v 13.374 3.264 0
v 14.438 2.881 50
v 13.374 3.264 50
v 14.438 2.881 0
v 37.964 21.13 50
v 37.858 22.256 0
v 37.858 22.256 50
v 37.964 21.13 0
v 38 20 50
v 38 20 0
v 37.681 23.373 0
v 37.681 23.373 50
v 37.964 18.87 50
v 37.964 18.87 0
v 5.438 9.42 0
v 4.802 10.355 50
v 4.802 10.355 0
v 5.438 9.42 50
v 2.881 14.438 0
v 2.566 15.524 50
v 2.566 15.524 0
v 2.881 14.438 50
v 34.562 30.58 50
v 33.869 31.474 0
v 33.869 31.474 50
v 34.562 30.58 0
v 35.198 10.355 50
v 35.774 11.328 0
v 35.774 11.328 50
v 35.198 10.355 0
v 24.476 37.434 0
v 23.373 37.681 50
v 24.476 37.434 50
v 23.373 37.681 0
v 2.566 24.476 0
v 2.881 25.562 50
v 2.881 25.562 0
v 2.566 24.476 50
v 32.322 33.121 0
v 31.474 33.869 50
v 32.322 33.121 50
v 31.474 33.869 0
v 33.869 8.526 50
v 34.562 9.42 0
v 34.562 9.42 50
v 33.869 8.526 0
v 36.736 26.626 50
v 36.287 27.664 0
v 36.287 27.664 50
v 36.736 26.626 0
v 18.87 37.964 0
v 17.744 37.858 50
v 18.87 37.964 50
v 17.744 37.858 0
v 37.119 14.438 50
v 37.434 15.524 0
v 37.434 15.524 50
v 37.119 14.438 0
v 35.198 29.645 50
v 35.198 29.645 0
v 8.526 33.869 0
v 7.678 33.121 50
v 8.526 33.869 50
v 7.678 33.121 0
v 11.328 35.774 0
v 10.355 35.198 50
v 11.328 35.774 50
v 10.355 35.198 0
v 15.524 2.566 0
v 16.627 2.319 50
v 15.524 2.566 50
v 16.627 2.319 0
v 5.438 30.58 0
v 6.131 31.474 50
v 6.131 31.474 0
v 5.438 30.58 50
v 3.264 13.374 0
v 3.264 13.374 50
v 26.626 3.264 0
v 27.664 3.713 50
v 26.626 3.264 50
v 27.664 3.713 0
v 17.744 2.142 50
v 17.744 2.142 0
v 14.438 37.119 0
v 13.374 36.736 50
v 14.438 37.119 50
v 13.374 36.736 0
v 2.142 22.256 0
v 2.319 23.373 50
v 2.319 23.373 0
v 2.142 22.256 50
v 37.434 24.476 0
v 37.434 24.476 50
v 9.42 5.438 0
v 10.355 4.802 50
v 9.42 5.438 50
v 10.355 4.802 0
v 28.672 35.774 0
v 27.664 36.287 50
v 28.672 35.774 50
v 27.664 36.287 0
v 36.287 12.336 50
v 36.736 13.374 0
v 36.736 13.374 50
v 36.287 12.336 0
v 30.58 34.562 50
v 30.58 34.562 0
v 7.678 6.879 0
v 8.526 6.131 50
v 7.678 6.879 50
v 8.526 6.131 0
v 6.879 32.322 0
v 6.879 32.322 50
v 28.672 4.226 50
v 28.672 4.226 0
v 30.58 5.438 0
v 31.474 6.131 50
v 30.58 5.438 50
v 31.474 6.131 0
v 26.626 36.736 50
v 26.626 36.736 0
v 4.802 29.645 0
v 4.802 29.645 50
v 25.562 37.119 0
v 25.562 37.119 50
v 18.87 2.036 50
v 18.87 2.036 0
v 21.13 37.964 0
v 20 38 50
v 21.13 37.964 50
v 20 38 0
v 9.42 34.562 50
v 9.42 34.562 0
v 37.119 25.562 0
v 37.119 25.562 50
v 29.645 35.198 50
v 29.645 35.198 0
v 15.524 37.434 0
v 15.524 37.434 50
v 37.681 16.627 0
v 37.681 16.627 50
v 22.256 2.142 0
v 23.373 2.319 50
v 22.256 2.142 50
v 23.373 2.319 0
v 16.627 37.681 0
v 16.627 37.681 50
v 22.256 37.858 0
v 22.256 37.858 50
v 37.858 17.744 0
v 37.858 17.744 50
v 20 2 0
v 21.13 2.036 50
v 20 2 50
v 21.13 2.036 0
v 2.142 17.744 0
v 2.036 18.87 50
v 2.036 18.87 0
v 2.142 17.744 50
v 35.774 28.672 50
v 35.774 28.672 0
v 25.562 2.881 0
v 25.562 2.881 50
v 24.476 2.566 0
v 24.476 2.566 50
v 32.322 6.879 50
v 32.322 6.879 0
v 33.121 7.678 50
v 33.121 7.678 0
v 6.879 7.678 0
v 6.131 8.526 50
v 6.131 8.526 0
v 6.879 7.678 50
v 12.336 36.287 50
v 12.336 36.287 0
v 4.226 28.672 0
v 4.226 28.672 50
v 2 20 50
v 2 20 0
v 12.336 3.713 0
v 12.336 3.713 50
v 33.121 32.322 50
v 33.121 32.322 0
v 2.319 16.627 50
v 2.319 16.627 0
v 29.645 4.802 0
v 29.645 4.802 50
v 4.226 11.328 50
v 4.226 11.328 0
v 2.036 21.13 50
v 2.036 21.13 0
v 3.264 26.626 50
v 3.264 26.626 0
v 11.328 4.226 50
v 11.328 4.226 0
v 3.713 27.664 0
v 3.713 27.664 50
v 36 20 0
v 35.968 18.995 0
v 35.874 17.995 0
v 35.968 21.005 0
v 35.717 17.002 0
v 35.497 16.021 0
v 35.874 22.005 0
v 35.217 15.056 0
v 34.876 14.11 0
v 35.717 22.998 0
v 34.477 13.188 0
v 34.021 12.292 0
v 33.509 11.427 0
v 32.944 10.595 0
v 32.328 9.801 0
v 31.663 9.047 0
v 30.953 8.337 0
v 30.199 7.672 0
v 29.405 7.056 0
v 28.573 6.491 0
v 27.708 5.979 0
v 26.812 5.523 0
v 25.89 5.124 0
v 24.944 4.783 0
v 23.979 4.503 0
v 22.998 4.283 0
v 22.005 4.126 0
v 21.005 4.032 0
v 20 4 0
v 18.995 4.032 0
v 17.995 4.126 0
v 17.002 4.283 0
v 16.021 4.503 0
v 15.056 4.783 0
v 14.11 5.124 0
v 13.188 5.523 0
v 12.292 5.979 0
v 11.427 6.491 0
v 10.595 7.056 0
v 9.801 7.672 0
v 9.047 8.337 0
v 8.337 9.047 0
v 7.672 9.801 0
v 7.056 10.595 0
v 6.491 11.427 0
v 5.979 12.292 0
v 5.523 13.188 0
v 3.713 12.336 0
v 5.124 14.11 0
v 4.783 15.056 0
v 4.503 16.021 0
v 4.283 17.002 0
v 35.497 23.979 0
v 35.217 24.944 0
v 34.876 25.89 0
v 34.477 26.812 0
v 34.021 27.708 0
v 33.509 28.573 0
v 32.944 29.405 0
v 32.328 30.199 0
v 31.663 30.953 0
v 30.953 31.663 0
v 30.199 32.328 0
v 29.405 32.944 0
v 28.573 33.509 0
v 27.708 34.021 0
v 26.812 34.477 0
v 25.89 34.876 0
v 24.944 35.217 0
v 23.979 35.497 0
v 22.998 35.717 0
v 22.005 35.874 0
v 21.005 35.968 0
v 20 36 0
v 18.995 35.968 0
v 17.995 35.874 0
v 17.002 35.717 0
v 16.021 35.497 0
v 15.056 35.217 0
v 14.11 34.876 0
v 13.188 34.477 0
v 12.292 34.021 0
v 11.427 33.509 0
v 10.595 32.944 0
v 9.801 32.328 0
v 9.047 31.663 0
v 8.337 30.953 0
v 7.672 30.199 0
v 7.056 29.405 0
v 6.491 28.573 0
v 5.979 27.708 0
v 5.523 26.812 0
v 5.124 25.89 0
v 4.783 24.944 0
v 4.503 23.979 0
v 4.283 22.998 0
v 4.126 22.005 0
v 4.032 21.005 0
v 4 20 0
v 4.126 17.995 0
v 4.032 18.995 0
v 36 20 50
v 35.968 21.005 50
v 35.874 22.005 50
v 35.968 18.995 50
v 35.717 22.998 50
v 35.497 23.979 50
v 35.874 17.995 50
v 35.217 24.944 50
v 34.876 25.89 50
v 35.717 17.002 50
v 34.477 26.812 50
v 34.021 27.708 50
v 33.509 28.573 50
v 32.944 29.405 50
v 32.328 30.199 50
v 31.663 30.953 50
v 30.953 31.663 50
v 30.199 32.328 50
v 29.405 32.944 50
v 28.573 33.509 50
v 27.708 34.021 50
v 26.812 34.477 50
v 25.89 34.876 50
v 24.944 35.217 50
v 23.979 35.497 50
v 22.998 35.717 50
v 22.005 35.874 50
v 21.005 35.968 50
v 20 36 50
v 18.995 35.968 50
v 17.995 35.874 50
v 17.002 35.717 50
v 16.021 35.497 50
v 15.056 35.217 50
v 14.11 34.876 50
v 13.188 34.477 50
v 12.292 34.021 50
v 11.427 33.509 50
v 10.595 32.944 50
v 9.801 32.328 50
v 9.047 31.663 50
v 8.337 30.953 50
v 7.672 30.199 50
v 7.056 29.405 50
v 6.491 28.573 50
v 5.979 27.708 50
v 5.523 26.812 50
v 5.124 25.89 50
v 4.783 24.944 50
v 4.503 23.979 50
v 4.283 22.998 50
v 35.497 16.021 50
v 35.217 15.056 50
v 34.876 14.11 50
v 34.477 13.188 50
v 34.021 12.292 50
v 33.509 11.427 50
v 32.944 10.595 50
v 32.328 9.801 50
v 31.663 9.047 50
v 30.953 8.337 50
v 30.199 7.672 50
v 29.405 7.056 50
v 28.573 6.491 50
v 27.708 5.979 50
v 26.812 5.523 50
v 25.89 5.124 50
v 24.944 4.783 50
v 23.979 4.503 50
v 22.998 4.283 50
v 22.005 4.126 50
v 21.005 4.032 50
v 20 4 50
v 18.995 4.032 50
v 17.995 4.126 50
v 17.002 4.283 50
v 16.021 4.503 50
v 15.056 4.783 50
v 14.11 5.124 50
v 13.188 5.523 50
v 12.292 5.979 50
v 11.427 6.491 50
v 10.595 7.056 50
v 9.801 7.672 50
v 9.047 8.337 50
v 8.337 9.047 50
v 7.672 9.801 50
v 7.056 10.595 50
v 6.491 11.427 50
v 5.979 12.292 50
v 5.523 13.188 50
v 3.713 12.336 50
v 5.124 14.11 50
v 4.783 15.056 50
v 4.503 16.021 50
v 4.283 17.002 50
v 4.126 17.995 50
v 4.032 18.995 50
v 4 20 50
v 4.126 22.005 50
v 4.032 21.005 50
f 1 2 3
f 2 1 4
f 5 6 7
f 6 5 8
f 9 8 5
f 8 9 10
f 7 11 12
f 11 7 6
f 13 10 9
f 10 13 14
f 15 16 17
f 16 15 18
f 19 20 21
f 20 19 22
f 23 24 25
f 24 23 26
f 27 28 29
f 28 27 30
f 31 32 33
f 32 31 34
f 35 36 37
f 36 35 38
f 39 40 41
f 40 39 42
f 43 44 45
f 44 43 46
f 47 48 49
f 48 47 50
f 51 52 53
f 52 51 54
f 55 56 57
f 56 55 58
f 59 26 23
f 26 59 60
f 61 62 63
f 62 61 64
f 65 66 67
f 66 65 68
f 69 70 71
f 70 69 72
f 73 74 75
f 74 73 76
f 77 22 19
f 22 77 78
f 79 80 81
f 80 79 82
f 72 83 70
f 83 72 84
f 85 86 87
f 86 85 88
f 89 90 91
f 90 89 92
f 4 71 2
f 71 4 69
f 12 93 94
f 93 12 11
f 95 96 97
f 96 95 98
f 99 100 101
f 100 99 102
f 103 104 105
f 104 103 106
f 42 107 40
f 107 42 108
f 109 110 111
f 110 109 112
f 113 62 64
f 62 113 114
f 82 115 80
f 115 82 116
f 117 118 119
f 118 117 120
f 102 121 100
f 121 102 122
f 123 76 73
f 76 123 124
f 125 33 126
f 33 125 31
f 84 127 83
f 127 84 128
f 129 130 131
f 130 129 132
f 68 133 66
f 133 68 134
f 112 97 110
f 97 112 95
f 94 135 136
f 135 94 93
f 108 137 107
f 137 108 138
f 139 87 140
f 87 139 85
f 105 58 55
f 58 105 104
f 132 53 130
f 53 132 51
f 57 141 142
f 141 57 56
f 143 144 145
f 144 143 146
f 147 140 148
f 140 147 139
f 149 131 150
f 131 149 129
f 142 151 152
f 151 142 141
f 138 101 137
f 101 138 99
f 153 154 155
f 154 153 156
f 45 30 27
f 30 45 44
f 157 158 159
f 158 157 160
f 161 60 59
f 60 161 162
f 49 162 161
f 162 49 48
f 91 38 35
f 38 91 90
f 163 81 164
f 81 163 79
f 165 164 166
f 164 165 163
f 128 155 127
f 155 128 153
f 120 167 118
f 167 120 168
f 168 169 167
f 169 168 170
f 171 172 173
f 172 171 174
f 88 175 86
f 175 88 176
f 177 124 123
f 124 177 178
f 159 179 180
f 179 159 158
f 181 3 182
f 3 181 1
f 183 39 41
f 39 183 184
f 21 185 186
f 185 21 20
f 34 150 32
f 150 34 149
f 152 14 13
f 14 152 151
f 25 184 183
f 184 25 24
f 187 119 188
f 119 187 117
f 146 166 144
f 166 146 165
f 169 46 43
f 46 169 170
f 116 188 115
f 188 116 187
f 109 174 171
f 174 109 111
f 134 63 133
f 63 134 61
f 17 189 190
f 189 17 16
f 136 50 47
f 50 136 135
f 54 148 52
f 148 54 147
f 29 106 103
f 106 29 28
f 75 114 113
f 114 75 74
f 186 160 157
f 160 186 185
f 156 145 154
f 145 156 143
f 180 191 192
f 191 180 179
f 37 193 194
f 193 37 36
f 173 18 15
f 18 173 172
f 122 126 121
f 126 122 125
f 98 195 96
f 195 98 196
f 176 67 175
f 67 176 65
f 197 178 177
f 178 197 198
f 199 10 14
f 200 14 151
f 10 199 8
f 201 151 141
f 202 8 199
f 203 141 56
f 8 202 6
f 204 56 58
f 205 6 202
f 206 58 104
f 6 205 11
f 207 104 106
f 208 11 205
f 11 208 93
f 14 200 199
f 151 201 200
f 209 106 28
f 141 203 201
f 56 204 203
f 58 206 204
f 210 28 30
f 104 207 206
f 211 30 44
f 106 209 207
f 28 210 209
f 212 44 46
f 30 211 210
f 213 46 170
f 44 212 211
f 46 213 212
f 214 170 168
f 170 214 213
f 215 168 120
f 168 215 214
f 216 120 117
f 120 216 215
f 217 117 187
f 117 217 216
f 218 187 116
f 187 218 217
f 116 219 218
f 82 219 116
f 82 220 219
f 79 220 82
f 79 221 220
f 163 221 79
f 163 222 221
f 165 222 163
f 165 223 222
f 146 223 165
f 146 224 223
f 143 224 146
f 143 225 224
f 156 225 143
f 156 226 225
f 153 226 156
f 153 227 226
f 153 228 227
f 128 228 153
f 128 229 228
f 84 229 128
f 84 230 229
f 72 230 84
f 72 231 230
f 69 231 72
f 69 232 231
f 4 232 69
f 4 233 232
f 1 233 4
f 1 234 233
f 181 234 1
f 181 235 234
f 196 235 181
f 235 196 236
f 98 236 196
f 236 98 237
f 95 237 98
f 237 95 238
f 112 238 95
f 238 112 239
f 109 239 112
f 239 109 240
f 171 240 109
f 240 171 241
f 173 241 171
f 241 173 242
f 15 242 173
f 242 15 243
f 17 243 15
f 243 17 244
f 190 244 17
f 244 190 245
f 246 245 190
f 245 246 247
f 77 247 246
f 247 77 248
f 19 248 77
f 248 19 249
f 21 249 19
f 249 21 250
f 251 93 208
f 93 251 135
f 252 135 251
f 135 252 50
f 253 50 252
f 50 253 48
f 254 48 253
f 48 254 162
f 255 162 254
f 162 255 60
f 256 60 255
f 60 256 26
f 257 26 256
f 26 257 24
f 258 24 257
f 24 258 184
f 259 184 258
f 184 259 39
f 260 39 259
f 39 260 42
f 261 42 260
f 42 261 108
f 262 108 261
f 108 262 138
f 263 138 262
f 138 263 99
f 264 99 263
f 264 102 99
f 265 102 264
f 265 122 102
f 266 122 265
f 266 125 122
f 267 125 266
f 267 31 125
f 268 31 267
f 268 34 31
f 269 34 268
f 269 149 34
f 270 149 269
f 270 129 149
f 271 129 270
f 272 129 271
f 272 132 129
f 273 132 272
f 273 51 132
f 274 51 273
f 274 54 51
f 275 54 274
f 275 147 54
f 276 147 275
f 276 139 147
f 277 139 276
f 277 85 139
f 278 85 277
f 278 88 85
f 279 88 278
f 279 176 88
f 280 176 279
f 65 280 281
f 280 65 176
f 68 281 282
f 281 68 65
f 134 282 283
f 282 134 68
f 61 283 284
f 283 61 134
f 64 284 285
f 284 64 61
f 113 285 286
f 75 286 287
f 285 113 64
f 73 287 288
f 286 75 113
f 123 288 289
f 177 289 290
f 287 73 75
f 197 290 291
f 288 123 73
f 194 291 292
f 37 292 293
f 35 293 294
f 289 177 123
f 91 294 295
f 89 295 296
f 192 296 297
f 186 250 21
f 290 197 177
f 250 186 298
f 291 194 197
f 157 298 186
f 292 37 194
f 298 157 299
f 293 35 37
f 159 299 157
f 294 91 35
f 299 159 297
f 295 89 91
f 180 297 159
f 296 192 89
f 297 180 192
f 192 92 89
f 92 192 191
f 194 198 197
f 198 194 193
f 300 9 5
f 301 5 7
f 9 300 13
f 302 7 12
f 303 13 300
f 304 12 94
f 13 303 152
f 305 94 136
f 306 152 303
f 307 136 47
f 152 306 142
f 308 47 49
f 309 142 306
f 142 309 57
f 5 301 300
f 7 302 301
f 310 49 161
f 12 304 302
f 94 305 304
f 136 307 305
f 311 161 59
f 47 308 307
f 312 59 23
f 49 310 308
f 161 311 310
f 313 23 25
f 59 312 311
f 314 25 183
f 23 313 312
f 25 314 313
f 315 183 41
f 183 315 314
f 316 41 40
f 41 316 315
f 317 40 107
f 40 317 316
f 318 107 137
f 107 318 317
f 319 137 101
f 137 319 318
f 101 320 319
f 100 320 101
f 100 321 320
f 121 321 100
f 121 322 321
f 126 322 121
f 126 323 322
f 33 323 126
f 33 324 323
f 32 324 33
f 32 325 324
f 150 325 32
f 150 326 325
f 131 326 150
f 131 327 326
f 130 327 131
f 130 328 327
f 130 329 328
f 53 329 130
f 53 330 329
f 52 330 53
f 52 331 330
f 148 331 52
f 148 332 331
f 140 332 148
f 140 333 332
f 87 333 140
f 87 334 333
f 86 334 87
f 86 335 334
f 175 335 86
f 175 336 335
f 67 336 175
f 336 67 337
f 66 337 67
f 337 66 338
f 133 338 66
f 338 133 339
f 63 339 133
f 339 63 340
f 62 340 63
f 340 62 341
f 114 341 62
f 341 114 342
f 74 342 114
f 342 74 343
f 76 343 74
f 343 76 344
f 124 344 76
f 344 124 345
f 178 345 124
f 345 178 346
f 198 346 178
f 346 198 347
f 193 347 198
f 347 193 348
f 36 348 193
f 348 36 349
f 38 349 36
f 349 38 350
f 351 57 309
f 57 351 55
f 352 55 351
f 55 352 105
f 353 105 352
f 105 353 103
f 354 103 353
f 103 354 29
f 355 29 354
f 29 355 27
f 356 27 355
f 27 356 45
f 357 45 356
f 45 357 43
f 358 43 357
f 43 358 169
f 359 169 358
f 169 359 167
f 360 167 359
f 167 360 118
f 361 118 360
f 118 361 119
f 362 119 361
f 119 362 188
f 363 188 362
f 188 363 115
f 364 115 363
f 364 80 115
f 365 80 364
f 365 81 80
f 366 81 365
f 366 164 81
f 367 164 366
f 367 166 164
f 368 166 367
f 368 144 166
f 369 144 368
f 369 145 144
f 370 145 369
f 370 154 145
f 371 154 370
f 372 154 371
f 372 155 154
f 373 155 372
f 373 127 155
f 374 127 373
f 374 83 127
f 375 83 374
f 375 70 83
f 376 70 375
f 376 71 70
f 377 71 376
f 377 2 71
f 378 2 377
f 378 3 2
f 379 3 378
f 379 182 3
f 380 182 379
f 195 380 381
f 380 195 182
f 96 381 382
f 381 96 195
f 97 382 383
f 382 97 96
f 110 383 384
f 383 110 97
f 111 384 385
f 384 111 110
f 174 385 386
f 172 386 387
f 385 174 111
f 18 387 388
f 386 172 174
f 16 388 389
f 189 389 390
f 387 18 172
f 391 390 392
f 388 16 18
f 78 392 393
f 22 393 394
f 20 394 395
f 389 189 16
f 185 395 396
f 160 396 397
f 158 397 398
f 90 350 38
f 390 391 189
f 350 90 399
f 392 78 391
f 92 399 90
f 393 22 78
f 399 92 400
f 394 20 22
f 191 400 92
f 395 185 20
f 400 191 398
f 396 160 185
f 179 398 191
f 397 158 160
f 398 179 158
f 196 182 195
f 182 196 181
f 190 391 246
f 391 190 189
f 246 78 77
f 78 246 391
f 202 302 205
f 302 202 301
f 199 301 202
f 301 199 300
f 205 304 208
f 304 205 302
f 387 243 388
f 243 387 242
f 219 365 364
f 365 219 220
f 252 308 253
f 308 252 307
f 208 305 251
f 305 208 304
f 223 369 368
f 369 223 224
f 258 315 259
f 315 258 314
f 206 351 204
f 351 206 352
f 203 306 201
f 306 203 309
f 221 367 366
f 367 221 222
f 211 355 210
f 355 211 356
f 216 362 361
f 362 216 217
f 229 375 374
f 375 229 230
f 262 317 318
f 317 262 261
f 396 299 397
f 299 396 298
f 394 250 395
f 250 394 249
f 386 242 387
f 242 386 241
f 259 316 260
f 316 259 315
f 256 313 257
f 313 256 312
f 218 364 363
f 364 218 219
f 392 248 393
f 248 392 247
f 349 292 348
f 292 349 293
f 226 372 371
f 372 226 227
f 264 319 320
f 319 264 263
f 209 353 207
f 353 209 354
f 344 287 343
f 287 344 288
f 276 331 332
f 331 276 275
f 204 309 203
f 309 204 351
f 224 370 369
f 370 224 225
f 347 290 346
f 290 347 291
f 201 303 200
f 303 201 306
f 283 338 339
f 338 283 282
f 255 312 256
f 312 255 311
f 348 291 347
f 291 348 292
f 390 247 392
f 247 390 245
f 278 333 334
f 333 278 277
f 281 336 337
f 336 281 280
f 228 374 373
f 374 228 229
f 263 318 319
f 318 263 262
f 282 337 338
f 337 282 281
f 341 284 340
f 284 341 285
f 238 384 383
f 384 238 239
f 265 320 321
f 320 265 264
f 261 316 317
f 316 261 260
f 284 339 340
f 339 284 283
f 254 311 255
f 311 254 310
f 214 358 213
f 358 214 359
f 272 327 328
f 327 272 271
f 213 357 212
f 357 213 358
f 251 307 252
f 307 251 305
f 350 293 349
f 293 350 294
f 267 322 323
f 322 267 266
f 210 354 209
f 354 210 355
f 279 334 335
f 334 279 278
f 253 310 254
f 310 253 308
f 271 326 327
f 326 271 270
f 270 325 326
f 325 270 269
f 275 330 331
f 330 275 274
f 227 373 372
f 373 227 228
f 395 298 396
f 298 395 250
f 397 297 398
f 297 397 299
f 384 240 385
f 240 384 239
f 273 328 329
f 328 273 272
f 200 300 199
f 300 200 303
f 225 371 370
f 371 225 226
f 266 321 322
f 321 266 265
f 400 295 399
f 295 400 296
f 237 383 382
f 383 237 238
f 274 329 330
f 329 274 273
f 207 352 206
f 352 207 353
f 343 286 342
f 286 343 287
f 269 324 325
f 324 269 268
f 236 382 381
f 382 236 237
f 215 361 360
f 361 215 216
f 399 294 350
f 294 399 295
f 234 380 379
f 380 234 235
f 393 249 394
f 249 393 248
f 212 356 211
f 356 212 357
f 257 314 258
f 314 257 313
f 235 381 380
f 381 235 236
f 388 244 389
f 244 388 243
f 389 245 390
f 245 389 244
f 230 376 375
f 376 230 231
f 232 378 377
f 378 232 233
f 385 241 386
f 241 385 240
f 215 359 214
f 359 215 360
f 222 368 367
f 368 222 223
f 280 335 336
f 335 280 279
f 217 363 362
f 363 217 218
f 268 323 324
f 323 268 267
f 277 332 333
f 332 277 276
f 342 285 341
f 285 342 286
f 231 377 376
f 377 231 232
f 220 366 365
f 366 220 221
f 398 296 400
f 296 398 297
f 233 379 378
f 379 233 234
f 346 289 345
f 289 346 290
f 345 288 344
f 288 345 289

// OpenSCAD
meshX=26;
meshY=18;
meshZ=40;
CylinderWidth=40;
Seedrows=1;
Seedcolumns=1;
Thickness=2;
CylinderHeight=50;
CellSpacing=2;
CellPad=20;


spokeCount=24;
spokerows=8;
spokeDia=15;
spokeY=2;
wallWidth=2;

Manafold();

module Manafold()
{
    //translate([0,0,meshZ])
    union()
    {
//        difference() 
//        {
//            //cube([meshZ*(Seedcolumns),meshZ*(Seedrows),Thickness]);
//            for(x = [1:Seedcolumns], Y =[1:Seedrows])
//            {
//                   //translate([(40*x), (40*Y),-1]) color("Blue") cube($fn=100,[35,35,5],center=true)
//                translate([(CylinderWidth*(x-1))+CellPad, (CylinderWidth*(Y-1))+CellPad,0]) color("Blue") 
//                difference()
//                {
//                    cylinder($fn=100,CylinderHeight,(CylinderWidth/2)-CellSpacing,(CylinderWidth/2)-CellSpacing,center=false);
//                }
//            }
//        }
        for(x = [1:Seedcolumns], Y =[1:Seedrows])
        {
               //translate([(40*x), (40*Y),-1]) color("Blue") cube($fn=100,[35,35,5],center=true)
            translate([(CylinderWidth*(x-1))+CellPad, (CylinderWidth*(Y-1))+CellPad,0])  
            difference()
            {
                color("Green")cylinder($fn=100,CylinderHeight,(CylinderWidth/2)-2,(CylinderWidth/2)-2,center=false);
                translate(0,0,10) cylinder($fn=100,CylinderHeight+2,((CylinderWidth/2)) - (wallWidth+CellSpacing),((CylinderWidth/2))-(wallWidth+CellSpacing),center=false);
            }
        }
    }
}
